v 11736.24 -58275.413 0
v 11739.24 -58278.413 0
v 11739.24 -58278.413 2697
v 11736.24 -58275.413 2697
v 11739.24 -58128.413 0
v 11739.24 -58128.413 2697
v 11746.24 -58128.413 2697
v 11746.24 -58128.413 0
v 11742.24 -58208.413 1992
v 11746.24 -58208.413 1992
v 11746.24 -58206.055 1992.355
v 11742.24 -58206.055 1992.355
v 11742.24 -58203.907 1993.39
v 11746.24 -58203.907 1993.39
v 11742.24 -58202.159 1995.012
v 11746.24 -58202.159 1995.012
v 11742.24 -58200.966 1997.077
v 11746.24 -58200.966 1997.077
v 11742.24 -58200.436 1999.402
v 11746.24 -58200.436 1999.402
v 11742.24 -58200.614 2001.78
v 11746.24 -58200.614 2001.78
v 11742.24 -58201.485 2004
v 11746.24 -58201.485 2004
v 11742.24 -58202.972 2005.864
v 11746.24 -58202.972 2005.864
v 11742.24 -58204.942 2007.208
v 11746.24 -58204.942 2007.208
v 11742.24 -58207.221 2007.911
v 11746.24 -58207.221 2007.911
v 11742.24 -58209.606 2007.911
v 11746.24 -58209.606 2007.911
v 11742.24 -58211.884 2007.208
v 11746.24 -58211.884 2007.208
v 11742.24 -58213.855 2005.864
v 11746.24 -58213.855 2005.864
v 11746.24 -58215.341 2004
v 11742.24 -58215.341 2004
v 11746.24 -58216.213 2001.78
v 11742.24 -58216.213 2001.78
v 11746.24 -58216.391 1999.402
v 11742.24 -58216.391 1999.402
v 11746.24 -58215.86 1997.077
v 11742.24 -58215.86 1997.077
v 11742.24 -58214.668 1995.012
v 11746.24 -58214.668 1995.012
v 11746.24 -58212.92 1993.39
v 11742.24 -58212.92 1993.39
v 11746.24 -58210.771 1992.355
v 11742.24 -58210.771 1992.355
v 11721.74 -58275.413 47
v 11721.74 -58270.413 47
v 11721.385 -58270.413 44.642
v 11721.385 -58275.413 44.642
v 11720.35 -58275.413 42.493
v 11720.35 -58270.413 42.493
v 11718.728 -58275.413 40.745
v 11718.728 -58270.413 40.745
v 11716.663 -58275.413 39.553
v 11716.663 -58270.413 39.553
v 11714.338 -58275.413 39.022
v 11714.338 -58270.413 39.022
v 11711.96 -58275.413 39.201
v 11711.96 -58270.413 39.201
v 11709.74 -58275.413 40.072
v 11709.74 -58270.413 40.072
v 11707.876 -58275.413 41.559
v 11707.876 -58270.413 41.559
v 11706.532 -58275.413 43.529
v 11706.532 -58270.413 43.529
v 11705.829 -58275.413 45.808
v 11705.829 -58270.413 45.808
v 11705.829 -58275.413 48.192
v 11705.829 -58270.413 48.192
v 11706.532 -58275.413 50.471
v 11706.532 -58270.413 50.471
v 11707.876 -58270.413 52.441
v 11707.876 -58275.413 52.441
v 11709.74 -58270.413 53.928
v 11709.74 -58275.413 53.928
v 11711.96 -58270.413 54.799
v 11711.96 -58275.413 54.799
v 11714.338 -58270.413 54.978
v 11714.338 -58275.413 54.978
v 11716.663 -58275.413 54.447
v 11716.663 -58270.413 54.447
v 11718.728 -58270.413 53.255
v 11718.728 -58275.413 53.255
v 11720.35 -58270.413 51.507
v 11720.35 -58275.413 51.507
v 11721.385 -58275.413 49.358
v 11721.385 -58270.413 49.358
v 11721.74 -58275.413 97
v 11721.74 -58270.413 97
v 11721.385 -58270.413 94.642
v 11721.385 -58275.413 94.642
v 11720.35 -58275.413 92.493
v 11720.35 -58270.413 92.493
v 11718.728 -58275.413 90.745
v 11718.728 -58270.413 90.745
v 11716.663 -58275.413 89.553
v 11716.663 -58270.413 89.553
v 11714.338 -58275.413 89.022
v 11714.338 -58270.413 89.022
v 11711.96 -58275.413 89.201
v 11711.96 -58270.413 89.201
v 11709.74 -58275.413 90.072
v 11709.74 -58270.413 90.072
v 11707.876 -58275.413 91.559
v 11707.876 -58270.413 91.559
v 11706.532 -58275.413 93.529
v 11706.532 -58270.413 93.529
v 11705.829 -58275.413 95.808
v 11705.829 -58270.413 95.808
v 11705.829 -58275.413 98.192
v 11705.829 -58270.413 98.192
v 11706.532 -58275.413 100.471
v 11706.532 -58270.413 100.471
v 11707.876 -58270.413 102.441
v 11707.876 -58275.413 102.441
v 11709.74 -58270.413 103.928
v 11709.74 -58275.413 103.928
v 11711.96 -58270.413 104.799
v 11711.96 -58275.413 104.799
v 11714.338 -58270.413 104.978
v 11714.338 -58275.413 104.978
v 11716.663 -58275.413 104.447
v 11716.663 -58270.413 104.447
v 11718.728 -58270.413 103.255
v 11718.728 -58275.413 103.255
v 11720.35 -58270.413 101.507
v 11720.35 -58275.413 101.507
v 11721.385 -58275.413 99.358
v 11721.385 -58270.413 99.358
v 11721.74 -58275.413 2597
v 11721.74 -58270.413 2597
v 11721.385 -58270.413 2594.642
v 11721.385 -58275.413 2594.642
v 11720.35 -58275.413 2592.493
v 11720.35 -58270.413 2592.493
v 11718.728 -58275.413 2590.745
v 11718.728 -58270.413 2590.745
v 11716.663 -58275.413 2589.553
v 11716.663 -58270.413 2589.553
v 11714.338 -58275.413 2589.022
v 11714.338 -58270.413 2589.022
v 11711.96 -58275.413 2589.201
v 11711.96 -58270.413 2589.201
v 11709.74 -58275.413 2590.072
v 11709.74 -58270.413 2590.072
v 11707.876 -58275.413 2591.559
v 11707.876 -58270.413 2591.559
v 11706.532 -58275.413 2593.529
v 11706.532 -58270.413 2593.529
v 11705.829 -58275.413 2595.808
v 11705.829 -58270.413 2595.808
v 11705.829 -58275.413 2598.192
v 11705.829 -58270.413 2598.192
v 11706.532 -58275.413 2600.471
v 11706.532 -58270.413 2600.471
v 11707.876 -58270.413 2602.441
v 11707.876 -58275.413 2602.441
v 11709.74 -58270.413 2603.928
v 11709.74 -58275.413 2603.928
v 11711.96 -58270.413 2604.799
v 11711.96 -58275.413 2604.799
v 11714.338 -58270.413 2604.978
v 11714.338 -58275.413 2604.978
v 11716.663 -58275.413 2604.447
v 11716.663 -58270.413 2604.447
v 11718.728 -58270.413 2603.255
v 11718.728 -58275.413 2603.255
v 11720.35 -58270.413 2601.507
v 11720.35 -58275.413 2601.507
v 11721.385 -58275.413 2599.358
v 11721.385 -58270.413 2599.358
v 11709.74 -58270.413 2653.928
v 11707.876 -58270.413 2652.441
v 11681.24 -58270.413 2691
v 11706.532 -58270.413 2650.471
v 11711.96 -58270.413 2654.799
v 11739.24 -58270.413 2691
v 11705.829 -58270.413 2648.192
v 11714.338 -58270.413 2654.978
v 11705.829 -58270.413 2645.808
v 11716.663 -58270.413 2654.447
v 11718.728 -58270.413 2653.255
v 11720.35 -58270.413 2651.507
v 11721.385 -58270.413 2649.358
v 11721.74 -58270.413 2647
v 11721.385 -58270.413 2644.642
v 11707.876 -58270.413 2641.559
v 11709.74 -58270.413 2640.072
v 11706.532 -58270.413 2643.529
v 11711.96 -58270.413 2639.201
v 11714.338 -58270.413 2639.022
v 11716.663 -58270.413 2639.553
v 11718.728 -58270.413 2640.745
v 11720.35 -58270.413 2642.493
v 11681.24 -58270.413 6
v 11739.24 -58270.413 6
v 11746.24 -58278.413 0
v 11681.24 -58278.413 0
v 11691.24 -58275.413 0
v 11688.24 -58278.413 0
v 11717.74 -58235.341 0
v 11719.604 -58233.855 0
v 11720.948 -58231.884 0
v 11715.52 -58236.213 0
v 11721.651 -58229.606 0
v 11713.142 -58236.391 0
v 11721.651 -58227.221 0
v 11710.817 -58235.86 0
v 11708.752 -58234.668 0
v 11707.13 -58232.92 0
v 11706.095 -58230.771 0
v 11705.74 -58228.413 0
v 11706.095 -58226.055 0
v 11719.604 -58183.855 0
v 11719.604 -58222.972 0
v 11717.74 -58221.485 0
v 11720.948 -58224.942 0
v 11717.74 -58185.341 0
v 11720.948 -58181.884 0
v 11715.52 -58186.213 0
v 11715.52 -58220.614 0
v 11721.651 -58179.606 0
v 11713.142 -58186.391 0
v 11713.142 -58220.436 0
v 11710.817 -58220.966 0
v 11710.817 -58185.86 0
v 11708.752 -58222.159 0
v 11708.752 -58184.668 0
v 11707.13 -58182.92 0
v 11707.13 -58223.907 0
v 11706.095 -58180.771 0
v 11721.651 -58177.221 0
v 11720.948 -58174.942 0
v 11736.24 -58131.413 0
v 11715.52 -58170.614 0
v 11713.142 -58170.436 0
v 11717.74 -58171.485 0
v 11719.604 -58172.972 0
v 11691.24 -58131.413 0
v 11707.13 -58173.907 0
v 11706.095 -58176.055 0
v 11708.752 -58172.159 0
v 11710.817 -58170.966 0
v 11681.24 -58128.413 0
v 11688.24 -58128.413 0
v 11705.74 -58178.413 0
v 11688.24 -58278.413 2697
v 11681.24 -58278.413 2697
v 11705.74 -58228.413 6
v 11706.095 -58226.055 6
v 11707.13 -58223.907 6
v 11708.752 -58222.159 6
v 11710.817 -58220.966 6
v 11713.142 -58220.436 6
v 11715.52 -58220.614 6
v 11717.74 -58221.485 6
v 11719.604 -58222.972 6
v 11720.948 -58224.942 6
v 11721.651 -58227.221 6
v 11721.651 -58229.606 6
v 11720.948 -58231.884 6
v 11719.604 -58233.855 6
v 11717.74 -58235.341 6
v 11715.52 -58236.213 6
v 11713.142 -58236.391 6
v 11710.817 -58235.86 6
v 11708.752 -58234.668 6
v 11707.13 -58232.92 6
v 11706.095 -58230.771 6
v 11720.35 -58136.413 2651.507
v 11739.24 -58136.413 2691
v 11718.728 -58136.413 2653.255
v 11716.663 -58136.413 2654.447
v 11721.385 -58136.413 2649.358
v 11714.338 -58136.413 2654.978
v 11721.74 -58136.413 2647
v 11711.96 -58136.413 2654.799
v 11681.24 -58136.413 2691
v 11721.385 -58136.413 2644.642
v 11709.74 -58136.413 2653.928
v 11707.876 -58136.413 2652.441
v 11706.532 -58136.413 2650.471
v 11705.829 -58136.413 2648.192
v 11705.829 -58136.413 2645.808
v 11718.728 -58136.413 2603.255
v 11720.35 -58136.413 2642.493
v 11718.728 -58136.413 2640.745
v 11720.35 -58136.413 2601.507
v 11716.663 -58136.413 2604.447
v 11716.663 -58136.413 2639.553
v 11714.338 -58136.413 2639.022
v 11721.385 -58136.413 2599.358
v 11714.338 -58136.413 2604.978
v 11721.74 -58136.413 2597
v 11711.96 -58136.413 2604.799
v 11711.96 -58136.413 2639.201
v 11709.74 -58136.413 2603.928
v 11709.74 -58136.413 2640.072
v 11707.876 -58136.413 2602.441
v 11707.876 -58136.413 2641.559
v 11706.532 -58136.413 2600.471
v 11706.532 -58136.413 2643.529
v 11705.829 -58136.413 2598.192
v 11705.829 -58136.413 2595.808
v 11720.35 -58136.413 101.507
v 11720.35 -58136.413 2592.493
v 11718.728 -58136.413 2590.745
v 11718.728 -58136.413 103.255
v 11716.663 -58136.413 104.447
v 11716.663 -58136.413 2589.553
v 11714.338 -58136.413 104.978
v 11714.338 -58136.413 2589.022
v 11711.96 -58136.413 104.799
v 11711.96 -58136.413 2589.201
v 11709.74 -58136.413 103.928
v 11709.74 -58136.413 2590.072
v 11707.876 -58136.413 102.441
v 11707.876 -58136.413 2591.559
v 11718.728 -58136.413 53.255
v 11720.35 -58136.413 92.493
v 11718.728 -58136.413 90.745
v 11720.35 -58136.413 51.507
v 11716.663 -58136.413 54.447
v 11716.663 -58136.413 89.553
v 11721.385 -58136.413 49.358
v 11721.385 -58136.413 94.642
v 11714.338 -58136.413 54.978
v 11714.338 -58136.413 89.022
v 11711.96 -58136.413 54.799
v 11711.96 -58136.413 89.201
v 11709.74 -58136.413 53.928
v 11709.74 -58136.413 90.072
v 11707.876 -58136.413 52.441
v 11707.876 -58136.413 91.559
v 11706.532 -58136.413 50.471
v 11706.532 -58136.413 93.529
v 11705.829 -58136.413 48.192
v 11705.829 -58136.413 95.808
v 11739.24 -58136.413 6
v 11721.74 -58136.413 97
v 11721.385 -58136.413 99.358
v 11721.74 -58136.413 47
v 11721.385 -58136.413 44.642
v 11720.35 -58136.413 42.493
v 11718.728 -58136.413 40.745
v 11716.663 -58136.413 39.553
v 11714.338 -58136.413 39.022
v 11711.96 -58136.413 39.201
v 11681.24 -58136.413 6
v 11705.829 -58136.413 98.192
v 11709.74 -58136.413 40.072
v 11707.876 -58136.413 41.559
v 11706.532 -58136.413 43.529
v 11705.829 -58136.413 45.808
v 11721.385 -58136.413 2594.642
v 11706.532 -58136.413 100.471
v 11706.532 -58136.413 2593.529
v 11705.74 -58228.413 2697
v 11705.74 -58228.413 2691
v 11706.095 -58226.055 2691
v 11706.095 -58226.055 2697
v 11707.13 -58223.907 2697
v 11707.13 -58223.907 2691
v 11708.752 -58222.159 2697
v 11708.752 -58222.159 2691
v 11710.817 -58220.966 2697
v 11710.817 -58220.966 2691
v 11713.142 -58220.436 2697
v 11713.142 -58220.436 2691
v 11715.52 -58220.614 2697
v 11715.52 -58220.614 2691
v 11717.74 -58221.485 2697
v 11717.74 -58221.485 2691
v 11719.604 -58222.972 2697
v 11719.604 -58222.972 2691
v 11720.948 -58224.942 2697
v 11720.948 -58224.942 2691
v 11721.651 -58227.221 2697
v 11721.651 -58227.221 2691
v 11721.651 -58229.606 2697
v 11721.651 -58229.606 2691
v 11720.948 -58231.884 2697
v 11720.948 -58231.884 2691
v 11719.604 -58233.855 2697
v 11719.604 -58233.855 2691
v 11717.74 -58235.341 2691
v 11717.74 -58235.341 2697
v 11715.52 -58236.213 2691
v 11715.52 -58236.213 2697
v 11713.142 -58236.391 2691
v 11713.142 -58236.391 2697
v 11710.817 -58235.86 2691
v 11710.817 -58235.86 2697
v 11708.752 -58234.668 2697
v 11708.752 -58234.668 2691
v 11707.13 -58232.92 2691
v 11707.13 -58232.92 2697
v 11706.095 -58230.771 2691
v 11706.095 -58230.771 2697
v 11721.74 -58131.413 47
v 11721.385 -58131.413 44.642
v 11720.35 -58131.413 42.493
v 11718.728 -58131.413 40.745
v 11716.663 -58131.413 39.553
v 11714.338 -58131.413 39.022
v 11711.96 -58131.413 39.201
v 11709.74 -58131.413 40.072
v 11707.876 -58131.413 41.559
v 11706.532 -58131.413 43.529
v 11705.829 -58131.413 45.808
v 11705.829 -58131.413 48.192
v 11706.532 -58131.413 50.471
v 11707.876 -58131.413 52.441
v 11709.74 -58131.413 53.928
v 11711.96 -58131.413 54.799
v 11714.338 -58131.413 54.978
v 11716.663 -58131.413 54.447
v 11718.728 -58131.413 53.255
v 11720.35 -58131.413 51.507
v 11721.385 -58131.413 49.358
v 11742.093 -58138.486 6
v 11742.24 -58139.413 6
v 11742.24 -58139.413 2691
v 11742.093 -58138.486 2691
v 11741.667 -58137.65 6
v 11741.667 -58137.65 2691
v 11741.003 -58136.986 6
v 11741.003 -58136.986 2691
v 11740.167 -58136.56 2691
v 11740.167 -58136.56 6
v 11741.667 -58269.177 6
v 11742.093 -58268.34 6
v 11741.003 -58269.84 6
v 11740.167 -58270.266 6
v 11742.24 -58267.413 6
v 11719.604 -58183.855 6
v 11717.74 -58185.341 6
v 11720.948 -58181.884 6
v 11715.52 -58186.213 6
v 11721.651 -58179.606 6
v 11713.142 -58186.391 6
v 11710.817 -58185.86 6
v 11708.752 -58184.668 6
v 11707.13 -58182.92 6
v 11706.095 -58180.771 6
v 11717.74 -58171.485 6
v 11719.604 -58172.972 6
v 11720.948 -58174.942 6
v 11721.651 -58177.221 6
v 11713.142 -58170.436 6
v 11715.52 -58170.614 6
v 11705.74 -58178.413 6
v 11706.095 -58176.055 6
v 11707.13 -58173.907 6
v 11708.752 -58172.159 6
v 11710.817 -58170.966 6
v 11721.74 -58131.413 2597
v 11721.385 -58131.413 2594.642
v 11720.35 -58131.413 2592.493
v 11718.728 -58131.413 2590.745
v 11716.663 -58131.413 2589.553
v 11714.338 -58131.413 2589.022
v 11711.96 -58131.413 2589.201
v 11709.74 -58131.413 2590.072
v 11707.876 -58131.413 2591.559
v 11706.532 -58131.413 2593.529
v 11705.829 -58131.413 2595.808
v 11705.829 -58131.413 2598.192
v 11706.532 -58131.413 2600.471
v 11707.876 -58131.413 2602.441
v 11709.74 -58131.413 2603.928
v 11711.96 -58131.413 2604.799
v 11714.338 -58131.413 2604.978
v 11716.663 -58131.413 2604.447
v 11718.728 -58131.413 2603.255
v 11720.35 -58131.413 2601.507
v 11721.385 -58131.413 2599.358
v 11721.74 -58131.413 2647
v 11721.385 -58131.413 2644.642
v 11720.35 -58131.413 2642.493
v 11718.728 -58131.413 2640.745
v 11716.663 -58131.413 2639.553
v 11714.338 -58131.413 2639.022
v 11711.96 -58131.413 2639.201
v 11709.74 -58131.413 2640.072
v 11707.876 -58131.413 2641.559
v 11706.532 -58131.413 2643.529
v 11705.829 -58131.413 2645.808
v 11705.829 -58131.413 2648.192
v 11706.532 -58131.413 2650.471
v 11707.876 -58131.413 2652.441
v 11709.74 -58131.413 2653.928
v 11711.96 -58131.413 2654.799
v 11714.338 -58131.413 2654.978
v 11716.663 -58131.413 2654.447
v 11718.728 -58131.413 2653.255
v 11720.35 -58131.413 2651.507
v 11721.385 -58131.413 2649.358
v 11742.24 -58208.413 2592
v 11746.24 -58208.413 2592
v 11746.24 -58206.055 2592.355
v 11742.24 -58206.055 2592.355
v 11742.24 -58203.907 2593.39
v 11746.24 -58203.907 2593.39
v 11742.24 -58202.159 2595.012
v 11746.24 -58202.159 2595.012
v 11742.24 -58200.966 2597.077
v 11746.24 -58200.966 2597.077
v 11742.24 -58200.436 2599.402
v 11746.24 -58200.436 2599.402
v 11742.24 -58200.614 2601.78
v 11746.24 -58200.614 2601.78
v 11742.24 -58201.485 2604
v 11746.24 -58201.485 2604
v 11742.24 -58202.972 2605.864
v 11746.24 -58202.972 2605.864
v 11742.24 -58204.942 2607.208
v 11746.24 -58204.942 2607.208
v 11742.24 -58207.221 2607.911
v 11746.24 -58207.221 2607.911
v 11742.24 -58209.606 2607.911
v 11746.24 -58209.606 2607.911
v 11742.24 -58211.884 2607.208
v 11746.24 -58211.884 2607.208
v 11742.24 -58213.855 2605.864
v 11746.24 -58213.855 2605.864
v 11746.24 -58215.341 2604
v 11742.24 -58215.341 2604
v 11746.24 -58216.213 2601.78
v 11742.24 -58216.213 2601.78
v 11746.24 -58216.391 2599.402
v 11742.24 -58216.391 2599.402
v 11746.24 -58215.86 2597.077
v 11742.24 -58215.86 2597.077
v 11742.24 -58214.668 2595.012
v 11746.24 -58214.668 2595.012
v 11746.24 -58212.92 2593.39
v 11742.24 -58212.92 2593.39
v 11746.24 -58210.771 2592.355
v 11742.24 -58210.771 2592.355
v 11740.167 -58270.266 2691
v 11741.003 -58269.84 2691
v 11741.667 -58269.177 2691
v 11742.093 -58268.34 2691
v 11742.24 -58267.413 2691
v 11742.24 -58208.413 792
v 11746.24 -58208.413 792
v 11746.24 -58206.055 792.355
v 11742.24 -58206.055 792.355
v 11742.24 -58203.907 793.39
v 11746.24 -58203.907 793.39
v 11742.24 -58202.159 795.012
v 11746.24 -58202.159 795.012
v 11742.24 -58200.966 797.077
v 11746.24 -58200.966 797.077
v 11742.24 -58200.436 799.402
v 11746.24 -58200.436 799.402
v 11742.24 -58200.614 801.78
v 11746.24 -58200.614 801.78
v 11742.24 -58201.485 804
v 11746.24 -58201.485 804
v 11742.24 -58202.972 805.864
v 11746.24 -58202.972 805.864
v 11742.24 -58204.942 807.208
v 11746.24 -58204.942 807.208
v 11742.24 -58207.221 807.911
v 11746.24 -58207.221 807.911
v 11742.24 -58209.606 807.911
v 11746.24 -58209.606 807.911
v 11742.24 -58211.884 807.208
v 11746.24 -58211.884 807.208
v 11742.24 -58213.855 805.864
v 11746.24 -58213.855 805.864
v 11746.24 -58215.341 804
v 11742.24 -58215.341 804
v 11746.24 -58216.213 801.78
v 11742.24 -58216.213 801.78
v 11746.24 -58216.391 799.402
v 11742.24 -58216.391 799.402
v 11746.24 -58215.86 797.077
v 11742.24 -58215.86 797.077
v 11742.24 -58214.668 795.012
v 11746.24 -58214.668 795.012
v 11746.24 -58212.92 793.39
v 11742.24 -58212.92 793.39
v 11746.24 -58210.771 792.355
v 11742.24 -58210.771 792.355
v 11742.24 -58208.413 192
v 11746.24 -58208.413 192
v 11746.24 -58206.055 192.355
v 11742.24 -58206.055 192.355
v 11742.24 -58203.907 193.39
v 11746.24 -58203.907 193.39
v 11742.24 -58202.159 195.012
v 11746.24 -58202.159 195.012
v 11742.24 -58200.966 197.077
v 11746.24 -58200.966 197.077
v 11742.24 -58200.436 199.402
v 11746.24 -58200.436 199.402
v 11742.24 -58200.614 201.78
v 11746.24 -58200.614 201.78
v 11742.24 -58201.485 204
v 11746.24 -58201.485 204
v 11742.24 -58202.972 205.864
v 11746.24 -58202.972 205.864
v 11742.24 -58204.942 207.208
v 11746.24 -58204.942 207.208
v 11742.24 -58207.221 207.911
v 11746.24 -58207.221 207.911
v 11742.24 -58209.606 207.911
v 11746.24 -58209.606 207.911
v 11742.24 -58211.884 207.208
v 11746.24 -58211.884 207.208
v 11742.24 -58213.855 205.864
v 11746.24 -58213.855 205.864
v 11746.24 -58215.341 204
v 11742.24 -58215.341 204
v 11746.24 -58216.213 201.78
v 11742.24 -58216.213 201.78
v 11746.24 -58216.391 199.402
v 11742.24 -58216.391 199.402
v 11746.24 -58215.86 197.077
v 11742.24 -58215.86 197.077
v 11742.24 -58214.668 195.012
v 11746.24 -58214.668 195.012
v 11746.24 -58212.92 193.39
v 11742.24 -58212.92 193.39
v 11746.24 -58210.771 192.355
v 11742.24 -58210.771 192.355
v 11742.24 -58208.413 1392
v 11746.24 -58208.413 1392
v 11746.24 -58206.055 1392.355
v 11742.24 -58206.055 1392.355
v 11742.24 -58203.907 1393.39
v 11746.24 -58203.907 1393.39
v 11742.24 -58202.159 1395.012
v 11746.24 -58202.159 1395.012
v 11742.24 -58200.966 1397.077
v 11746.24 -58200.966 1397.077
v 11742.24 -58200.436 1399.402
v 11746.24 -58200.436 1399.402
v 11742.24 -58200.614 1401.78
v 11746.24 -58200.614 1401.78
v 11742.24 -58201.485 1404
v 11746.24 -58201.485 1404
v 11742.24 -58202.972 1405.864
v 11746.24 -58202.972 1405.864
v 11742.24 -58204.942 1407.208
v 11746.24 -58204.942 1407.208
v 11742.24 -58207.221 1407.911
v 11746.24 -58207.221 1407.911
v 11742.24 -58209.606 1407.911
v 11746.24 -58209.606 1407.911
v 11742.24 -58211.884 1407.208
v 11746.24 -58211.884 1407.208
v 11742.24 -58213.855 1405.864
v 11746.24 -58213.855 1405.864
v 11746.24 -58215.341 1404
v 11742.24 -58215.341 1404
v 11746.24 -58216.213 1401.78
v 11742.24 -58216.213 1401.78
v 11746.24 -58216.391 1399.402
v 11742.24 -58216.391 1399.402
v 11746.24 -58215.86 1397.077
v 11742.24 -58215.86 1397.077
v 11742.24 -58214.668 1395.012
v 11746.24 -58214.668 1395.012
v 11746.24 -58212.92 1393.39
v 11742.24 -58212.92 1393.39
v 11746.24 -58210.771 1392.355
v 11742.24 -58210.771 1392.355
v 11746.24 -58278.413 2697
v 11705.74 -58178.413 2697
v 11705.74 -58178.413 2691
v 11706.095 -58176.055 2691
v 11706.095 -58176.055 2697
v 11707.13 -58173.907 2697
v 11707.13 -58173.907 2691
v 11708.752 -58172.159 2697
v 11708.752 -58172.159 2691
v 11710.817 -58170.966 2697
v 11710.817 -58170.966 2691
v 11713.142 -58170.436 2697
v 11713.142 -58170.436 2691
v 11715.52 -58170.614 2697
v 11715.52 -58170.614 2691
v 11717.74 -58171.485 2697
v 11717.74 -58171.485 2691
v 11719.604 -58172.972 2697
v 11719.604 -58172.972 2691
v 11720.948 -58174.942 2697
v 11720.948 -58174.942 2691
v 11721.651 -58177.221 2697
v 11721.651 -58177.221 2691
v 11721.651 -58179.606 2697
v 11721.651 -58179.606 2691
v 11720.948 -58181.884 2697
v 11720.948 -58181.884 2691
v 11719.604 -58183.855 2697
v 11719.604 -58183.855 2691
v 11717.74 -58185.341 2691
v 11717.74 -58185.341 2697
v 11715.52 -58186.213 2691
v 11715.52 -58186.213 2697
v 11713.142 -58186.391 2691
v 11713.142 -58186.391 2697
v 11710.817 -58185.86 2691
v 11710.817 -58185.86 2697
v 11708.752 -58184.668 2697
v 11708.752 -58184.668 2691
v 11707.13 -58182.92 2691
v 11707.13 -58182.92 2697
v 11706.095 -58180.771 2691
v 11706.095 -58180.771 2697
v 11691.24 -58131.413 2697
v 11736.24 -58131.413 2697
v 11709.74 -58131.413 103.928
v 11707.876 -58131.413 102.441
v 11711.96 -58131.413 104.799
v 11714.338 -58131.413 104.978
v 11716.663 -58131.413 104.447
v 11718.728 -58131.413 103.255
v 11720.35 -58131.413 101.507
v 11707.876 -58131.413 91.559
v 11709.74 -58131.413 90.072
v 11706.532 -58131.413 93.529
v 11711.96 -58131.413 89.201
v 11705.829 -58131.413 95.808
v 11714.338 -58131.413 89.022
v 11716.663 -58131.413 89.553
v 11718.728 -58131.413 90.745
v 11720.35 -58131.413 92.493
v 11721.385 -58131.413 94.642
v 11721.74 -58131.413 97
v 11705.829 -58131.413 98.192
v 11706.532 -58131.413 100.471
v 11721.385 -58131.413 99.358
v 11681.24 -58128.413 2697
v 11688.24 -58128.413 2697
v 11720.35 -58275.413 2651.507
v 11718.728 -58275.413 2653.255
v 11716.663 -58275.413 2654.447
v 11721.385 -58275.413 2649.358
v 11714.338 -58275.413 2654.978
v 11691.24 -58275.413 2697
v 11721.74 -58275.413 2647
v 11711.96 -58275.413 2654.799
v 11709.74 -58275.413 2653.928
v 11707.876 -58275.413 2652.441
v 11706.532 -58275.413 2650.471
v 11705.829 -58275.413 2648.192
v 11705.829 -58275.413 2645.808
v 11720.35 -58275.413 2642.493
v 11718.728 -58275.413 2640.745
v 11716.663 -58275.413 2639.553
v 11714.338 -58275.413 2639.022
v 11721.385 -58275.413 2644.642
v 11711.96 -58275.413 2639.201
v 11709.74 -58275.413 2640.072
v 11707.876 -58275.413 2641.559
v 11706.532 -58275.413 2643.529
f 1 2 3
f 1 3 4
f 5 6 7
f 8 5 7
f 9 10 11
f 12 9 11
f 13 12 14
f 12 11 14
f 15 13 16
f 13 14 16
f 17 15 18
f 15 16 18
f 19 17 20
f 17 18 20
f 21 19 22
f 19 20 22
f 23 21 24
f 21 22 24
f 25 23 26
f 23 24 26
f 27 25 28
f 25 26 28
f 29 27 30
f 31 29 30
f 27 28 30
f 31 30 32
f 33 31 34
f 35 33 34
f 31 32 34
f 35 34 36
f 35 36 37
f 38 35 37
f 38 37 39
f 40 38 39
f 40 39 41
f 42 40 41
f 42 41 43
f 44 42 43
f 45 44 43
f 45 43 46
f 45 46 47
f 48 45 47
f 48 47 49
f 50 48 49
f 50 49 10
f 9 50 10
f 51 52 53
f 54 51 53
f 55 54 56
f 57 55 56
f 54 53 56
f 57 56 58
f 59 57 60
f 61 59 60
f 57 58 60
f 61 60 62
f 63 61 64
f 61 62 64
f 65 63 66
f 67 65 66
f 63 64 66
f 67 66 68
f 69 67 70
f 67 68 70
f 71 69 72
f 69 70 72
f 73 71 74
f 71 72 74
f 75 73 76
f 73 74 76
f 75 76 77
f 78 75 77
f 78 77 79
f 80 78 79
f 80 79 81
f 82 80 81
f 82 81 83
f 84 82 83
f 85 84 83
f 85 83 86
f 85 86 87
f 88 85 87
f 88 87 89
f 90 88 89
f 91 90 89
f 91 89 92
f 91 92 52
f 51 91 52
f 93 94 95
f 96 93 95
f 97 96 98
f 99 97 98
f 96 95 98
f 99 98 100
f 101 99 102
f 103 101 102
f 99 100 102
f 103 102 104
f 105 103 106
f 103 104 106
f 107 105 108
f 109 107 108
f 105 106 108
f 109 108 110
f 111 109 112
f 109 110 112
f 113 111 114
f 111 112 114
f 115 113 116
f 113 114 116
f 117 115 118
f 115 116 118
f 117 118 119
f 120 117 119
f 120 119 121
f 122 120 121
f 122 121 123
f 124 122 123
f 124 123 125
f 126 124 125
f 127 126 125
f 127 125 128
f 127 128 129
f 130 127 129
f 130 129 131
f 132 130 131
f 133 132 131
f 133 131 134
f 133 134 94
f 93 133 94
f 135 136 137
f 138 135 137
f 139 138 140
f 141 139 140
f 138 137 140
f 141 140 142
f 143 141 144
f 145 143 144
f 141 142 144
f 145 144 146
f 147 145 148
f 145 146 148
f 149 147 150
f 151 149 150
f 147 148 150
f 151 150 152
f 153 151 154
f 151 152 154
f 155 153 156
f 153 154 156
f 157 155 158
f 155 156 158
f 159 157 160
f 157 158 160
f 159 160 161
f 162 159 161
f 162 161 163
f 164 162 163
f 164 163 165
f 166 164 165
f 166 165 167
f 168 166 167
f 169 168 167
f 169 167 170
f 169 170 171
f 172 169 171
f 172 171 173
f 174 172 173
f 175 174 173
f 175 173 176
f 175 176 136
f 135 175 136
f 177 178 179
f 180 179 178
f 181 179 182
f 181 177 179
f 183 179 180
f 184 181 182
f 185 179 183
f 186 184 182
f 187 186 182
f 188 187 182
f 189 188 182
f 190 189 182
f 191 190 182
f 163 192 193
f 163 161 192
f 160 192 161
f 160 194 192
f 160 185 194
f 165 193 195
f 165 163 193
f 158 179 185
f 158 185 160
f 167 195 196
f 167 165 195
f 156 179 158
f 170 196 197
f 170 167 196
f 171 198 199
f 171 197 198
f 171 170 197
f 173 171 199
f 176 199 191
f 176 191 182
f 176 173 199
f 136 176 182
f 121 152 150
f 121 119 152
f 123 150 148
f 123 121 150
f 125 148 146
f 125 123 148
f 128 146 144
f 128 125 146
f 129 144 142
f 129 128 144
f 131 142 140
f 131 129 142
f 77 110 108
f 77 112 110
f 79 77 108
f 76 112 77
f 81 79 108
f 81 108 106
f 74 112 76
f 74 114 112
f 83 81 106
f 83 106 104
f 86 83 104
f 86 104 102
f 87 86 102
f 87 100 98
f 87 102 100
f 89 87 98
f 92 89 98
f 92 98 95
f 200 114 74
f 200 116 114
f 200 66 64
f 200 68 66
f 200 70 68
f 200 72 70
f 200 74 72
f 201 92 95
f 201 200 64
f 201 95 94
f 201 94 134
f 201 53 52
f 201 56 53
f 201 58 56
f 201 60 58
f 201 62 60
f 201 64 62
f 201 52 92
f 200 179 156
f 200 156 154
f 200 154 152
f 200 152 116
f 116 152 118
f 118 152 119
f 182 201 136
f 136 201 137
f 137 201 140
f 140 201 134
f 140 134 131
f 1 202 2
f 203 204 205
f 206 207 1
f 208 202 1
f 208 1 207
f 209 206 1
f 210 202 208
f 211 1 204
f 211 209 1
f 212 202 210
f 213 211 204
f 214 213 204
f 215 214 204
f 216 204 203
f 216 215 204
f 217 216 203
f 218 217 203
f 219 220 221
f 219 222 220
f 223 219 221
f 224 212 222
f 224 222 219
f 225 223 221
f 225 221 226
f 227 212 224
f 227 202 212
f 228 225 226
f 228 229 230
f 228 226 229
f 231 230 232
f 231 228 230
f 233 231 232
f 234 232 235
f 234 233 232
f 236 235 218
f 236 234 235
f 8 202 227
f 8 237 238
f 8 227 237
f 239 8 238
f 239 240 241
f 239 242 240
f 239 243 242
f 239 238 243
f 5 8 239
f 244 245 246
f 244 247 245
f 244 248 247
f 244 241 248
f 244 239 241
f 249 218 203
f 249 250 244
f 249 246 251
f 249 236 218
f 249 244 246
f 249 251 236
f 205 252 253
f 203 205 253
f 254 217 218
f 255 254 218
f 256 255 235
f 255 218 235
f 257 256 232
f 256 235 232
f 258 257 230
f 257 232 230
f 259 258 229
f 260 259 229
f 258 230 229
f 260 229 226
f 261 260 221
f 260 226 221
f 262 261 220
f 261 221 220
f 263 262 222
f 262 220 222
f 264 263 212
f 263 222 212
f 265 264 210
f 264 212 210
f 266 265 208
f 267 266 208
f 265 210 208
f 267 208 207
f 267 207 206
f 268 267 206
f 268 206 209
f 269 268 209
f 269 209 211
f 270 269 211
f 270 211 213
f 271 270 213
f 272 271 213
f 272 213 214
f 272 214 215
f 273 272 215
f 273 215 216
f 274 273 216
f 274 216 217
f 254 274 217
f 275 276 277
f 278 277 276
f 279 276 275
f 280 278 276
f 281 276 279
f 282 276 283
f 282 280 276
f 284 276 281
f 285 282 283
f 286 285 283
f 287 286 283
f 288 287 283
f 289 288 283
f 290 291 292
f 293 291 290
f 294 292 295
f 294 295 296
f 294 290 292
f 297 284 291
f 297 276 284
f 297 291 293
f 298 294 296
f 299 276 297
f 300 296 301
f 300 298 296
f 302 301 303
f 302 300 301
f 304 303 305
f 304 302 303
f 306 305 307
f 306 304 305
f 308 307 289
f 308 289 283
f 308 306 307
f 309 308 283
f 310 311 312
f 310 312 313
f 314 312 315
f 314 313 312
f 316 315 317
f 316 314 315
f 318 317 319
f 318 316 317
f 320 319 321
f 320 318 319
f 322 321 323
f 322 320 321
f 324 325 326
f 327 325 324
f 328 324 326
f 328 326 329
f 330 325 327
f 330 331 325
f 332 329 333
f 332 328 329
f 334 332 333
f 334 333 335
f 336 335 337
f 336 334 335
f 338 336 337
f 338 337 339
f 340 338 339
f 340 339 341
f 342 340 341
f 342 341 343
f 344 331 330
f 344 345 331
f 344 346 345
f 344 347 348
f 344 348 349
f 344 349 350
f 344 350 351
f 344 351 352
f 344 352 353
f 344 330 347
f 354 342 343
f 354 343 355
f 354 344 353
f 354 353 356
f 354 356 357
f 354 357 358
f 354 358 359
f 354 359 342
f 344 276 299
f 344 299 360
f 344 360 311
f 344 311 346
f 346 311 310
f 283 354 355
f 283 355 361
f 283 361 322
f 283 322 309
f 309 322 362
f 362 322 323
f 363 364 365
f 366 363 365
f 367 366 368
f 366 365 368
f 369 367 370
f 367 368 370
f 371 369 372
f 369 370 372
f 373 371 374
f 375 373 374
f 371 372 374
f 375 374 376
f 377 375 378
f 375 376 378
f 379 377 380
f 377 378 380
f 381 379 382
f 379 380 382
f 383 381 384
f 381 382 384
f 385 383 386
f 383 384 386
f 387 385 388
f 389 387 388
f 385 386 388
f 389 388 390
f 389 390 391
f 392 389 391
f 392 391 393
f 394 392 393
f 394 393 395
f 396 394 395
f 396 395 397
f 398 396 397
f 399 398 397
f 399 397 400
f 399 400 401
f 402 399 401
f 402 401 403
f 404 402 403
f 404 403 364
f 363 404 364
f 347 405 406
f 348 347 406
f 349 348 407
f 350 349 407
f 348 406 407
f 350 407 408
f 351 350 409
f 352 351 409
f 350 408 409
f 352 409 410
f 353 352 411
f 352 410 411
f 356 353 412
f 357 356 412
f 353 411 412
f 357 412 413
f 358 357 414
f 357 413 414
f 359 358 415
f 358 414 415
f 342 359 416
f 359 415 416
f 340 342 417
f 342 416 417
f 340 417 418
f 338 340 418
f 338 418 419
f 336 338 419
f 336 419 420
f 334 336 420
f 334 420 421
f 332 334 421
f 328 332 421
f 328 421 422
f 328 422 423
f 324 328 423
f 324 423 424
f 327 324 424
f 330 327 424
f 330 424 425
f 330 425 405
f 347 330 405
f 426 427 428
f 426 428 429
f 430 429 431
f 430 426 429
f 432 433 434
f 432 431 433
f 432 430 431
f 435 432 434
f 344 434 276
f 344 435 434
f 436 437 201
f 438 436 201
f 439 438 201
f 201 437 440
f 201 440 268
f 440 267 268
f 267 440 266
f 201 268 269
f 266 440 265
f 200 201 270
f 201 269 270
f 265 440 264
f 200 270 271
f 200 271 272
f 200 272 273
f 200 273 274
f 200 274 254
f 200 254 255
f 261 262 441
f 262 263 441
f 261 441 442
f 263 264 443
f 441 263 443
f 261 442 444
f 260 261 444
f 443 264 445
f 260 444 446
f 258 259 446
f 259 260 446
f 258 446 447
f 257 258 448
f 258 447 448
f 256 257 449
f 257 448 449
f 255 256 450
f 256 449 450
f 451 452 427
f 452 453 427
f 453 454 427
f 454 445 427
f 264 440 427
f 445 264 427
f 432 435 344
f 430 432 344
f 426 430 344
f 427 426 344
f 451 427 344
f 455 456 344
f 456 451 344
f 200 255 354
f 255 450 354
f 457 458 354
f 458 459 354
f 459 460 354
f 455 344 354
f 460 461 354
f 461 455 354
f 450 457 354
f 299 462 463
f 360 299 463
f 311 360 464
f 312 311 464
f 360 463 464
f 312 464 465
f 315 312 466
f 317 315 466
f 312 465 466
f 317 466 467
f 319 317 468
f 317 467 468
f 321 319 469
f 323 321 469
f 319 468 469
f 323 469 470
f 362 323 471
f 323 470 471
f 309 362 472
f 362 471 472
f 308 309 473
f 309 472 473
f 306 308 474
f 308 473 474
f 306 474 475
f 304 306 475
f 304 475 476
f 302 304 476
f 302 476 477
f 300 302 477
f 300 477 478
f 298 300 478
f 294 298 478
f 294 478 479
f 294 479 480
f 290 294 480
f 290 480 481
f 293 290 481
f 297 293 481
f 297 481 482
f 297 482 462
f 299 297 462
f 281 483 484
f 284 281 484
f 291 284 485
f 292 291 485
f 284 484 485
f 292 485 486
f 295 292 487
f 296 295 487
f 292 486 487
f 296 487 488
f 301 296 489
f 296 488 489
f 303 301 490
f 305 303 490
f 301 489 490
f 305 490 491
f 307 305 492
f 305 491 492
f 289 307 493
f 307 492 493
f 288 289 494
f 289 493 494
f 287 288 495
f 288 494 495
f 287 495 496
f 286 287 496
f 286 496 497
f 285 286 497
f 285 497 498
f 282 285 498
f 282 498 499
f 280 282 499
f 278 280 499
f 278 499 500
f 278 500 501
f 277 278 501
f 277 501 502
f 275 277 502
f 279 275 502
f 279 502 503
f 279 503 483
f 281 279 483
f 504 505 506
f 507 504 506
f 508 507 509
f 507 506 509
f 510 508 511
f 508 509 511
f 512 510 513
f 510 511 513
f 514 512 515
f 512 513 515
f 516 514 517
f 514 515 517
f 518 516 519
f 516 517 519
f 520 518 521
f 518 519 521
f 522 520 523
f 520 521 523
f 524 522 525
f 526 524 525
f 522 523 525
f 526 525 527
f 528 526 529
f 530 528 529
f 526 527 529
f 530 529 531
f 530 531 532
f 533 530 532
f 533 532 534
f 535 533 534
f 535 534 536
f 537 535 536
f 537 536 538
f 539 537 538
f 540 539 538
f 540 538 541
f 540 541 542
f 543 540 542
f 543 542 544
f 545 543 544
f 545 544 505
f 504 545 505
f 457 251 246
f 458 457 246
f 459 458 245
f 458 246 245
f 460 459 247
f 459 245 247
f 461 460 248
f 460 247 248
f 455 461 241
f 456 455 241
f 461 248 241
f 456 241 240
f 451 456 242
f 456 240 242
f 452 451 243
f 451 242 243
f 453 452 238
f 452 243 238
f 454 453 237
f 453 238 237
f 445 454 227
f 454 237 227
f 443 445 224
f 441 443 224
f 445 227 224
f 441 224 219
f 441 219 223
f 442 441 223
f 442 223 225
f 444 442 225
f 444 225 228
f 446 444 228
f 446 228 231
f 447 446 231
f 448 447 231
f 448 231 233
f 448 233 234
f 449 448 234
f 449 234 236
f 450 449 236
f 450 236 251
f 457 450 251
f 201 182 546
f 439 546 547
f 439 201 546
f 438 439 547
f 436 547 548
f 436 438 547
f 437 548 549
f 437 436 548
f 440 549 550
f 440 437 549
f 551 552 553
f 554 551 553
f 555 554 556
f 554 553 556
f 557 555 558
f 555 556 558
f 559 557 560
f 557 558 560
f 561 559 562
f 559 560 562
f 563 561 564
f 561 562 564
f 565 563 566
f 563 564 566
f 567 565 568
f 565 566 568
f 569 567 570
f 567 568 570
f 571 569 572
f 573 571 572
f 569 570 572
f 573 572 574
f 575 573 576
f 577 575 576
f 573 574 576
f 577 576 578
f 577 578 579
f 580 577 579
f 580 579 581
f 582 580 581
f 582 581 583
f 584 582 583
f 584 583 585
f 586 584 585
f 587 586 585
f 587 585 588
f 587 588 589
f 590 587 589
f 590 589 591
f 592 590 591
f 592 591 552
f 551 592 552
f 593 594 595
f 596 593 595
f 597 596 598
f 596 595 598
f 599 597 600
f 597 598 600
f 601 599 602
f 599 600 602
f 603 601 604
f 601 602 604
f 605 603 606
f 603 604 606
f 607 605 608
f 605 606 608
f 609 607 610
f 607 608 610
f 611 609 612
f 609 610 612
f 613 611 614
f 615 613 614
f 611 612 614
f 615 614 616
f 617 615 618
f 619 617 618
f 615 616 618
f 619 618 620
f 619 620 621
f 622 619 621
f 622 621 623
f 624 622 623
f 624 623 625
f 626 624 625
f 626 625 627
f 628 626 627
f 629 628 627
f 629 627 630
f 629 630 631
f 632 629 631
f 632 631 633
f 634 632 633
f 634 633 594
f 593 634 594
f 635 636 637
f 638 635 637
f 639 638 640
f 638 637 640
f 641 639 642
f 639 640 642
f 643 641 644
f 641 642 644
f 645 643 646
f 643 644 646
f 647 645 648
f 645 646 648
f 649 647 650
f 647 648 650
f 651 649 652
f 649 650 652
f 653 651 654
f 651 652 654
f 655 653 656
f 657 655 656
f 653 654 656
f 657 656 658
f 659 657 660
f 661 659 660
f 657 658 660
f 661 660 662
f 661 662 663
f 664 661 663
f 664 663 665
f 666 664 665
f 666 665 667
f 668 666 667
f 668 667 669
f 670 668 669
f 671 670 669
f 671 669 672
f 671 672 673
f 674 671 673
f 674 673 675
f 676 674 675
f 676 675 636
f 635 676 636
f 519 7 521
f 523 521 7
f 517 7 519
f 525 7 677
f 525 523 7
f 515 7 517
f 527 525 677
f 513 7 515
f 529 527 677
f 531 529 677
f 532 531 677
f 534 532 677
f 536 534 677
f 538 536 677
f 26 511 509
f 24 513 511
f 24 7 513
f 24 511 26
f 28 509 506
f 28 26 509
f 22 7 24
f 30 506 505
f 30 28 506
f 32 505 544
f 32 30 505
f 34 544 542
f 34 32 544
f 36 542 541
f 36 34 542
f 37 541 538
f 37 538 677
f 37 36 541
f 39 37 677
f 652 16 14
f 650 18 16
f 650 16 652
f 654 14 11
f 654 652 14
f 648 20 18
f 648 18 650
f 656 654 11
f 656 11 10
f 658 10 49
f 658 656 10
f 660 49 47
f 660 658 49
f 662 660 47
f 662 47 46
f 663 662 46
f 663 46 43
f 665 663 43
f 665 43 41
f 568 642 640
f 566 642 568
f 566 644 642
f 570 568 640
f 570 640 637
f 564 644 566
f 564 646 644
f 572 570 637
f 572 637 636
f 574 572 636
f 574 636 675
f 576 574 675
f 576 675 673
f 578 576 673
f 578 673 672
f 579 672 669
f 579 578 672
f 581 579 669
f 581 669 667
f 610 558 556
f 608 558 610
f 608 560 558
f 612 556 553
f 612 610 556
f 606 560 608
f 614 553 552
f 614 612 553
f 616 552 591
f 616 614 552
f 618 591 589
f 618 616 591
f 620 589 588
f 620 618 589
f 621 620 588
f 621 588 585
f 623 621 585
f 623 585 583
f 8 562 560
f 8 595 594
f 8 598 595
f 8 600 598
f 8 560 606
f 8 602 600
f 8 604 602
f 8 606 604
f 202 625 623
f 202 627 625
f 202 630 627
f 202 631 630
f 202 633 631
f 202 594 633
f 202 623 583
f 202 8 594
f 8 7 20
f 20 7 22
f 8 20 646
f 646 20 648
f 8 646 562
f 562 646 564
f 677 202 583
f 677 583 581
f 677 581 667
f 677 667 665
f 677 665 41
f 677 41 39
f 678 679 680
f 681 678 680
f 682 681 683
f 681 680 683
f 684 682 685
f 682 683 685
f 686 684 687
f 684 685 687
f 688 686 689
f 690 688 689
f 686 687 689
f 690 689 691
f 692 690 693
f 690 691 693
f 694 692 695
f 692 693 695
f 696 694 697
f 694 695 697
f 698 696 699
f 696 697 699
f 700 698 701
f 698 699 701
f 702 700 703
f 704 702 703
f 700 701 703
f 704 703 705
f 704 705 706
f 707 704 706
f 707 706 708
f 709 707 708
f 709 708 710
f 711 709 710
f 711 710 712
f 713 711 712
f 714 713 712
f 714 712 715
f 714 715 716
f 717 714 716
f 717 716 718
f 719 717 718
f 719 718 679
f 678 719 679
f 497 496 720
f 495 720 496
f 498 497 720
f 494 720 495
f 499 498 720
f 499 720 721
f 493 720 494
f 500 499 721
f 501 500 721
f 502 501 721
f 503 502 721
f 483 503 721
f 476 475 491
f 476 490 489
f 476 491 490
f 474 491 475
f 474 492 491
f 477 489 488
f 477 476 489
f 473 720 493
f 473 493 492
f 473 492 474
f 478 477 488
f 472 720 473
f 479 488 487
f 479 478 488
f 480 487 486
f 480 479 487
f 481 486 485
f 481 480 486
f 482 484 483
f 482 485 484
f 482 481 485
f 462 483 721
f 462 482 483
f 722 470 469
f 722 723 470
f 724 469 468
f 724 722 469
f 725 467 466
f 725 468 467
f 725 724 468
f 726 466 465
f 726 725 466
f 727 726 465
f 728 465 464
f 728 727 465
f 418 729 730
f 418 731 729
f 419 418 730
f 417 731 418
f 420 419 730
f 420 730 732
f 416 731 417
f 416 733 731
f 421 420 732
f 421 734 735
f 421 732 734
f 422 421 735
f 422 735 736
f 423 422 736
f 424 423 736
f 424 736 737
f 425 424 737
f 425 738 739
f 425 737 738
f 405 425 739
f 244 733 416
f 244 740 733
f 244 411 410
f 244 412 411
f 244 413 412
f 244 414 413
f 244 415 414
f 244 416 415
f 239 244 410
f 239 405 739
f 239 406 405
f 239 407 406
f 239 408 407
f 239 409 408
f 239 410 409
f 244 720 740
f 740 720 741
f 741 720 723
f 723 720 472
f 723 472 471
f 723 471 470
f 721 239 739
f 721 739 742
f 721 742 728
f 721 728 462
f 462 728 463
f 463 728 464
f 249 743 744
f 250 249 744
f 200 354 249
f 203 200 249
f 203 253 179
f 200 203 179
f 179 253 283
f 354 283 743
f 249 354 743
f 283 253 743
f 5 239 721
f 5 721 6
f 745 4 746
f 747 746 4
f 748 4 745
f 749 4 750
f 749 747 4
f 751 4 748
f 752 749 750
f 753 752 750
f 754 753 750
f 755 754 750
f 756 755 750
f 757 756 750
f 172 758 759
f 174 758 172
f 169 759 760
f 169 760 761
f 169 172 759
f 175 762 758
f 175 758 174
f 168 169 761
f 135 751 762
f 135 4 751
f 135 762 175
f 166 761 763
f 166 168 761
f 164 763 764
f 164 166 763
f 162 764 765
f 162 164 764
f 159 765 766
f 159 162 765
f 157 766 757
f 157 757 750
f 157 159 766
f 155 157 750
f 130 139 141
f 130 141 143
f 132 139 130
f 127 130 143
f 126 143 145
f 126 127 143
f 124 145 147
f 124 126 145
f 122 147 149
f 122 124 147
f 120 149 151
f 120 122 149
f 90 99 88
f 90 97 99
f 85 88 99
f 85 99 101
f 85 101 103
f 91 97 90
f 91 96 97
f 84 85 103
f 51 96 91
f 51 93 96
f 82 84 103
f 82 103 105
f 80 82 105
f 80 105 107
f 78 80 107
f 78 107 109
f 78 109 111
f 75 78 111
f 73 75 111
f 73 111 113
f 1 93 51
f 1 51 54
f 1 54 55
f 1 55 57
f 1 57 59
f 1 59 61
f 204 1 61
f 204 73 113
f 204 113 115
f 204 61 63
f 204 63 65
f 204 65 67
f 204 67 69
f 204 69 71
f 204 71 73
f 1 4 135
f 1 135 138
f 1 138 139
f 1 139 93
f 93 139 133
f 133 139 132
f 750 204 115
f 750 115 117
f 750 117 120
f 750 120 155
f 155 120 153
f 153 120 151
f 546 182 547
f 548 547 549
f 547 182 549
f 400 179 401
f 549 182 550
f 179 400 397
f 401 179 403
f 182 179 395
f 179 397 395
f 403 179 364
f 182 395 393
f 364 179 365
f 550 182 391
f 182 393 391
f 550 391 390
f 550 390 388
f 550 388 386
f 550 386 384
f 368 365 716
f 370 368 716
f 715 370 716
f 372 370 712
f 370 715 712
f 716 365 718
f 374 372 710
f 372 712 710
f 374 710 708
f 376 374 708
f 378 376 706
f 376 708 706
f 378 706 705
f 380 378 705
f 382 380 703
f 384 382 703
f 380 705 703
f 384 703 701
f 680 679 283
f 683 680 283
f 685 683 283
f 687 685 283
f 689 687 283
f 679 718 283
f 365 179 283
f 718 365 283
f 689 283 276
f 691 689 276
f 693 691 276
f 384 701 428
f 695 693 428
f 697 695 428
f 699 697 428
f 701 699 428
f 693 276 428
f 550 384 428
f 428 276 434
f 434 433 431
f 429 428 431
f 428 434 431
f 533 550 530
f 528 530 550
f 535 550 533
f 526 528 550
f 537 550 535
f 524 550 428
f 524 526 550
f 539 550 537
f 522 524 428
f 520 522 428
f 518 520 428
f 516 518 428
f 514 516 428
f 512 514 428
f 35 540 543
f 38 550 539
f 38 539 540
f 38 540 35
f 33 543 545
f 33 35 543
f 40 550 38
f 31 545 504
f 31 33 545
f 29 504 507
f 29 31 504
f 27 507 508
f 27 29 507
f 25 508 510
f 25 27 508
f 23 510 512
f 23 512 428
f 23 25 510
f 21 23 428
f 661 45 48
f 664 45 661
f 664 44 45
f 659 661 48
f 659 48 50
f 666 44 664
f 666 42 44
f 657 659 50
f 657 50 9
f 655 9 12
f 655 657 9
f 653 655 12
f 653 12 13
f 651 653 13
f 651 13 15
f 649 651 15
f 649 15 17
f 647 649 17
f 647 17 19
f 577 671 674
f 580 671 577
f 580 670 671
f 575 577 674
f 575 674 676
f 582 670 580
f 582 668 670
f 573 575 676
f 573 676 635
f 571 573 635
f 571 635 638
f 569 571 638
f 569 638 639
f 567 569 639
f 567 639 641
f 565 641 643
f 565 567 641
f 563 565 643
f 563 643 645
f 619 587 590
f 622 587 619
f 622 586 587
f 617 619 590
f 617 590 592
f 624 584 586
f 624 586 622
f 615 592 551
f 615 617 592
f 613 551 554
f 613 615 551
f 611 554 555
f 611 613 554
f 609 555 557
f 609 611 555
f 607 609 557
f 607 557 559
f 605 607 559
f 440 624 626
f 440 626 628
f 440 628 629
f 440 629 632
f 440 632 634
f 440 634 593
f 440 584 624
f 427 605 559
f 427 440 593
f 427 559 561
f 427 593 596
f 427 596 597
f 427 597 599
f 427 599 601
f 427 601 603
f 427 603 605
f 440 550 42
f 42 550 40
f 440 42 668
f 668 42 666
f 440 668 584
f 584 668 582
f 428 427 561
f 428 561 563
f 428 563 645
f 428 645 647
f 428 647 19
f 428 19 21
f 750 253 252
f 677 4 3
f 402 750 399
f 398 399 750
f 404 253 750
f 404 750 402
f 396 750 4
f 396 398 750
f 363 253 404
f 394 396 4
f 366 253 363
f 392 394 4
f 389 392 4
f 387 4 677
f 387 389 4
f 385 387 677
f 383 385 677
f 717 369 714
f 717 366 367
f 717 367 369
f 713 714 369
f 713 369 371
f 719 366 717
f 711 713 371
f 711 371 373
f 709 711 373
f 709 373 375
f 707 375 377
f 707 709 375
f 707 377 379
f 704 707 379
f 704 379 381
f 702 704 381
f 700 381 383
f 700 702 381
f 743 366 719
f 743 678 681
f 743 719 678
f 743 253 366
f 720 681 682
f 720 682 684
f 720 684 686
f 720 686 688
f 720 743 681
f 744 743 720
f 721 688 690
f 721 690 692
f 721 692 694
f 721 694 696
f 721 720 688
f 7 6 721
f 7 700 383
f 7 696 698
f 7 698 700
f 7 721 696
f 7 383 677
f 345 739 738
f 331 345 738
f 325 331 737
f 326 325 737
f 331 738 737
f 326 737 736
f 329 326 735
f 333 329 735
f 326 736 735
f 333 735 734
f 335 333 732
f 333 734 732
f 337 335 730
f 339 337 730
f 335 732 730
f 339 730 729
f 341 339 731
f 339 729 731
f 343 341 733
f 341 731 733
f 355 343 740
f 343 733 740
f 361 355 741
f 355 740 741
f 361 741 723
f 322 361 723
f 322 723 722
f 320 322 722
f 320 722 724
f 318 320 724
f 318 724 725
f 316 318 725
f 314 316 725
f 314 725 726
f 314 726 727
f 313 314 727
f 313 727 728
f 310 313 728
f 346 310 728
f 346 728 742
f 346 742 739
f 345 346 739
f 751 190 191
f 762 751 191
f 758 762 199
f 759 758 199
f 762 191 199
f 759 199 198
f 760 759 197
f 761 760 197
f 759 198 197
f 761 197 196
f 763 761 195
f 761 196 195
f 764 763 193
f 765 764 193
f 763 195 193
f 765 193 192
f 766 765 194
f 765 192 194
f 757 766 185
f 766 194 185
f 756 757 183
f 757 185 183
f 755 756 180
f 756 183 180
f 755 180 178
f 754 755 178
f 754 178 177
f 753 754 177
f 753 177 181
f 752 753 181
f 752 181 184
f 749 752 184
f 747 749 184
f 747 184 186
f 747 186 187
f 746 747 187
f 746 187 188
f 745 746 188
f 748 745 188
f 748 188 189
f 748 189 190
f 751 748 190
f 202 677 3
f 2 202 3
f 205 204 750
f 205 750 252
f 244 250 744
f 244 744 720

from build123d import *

# Parameters (mm, degrees)
EXTRUDE_1_DEPTH             = 2697
SKETCH_2_W                  = 61
SKETCH_2_H                  = 134
EXTRUDE_2_DEPTH             = 6
SKETCH_3_W                  = 61
SKETCH_3_H                  = 134
EXTRUDE_3_DEPTH             = 6
HOLE_WIZARD_16_0_16_1_D     = 16
HOLE_WIZARD_16_0_16_1_DEPTH = 5
HOLE_WIZARD_16_0_16_1_TIP   = 4.806884952
HOLE_WIZARD_16_0_16_2_D     = 16
PATTERN_LINEAR_1_COUNT      = 2
PATTERN_LINEAR_1_PITCH      = 50
HOLE_WIZARD_16_0_16_3_D     = 16
HOLE_WIZARD_16_0_16_4_D     = 16
PATTERN_LINEAR_2_COUNT      = 2
PATTERN_LINEAR_2_PITCH      = 50


with BuildPart() as part:
    # Model → 凸台-拉伸1 (new body)
    with BuildSketch(Plane.XY):
        with BuildLine():
            Line((11739.240027423, -58278.413223948), (11736.240027423, -58275.413223948))
            Line((11736.240027423, -58275.413223948), (11691.240027423, -58275.413223948))
            Line((11691.240027423, -58275.413223948), (11688.240027423, -58278.413223948))
            Line((11688.240027423, -58278.413223948), (11681.240027423, -58278.413223948))
            Line((11681.240027423, -58278.413223948), (11681.240027423, -58270.413223948))
            Line((11681.240027423, -58270.413223948), (11739.240027423, -58270.413223948))
            ThreePointArc((11739.240027423, -58270.413223948), (11741.361347766, -58269.534544291), (11742.240027423, -58267.413223948))
            Line((11742.240027423, -58267.413223948), (11742.240027423, -58139.413223948))
            ThreePointArc((11742.240027423, -58139.413223948), (11741.361347766, -58137.291903604), (11739.240027423, -58136.413223948))
            Line((11739.240027423, -58136.413223948), (11681.240027423, -58136.413223948))
            Line((11681.240027423, -58136.413223948), (11681.240027423, -58128.413223948))
            Line((11681.240027423, -58128.413223948), (11688.240027423, -58128.413223948))
            Line((11688.240027423, -58128.413223948), (11691.240027423, -58131.413223948))
            Line((11691.240027423, -58131.413223948), (11736.240027423, -58131.413223948))
            Line((11736.240027423, -58131.413223948), (11739.240027423, -58128.413223948))
            Line((11739.240027423, -58128.413223948), (11746.240027423, -58128.413223948))
            Line((11746.240027423, -58128.413223948), (11746.240027423, -58278.413223948))
            Line((11746.240027423, -58278.413223948), (11739.240027423, -58278.413223948))
        make_face()
    extrude(amount=EXTRUDE_1_DEPTH)

    # 草图2 → 凸台-拉伸2 (add)
    with BuildSketch(Plane.XY.offset(2697)):
        with Locations((11711.740027423, -58203.413223948)):
            Rectangle(SKETCH_2_W, SKETCH_2_H)
    extrude(amount=-EXTRUDE_2_DEPTH)

    # 草图3 → 凸台-拉伸3 (add)
    with BuildSketch(Plane(origin=(0, 0, 0), x_dir=(-1, 0, 0), z_dir=(0, 0, -1))):
        with Locations((-11711.740027423, -58203.413223948)):
            Rectangle(SKETCH_3_W, SKETCH_3_H)
    extrude(amount=-EXTRUDE_3_DEPTH)

    # Ø16.0 (16) 直径孔1
    with Locations(Plane.ZY.offset(-11742.240027423)):
        with Locations((200, -58208.413223948), (800, -58208.413223948), (1400, -58208.413223948), (2000, -58208.413223948), (2600, -58208.413223948)):
            Hole(HOLE_WIZARD_16_0_16_1_D / 2, depth=HOLE_WIZARD_16_0_16_1_DEPTH)
            with Locations((0, 0, -(HOLE_WIZARD_16_0_16_1_DEPTH + HOLE_WIZARD_16_0_16_1_TIP / 2))):  # 118° drill point
                Cone(0, HOLE_WIZARD_16_0_16_1_D / 2, HOLE_WIZARD_16_0_16_1_TIP, mode=Mode.SUBTRACT)

    # Ø16.0 (16) 直径孔2 (through all)
    with Locations(Plane(origin=(0, -58275.413223948, 0), x_dir=(-1, 0, 0), z_dir=(0, -1, 0))):
        with Locations((-11713.740027423, -2647)):
            hole_wizard_16_0_16_2 = Hole(HOLE_WIZARD_16_0_16_2_D / 2)

    # 阵列(线性)1: Ø16.0 (16) 直径孔2 ×2
    with Locations(*[(0, 0, -i * PATTERN_LINEAR_1_PITCH) for i in range(1, PATTERN_LINEAR_1_COUNT)]):
        add(hole_wizard_16_0_16_2, mode=Mode.SUBTRACT)

    # Ø16.0 (16) 直径孔3 (through all)
    with Locations(Plane(origin=(0, -58275.413223948, 0), x_dir=(-1, 0, 0), z_dir=(0, -1, 0))):
        with Locations((-11713.740027423, -47), (-11713.740027423, -97)):
            Hole(HOLE_WIZARD_16_0_16_3_D / 2)

    # Ø16.0 (16) 直径孔4 (through all)
    with Locations(Plane.XY.offset(2697)):
        with Locations((11713.740027423, -58178.413223948)):
            hole_wizard_16_0_16_4 = Hole(HOLE_WIZARD_16_0_16_4_D / 2)

    # 阵列(线性)2: Ø16.0 (16) 直径孔4 ×2
    with Locations(*[(0, -i * PATTERN_LINEAR_2_PITCH, 0) for i in range(1, PATTERN_LINEAR_2_COUNT)]):
        add(hole_wizard_16_0_16_4, mode=Mode.SUBTRACT)


solid = part.part
